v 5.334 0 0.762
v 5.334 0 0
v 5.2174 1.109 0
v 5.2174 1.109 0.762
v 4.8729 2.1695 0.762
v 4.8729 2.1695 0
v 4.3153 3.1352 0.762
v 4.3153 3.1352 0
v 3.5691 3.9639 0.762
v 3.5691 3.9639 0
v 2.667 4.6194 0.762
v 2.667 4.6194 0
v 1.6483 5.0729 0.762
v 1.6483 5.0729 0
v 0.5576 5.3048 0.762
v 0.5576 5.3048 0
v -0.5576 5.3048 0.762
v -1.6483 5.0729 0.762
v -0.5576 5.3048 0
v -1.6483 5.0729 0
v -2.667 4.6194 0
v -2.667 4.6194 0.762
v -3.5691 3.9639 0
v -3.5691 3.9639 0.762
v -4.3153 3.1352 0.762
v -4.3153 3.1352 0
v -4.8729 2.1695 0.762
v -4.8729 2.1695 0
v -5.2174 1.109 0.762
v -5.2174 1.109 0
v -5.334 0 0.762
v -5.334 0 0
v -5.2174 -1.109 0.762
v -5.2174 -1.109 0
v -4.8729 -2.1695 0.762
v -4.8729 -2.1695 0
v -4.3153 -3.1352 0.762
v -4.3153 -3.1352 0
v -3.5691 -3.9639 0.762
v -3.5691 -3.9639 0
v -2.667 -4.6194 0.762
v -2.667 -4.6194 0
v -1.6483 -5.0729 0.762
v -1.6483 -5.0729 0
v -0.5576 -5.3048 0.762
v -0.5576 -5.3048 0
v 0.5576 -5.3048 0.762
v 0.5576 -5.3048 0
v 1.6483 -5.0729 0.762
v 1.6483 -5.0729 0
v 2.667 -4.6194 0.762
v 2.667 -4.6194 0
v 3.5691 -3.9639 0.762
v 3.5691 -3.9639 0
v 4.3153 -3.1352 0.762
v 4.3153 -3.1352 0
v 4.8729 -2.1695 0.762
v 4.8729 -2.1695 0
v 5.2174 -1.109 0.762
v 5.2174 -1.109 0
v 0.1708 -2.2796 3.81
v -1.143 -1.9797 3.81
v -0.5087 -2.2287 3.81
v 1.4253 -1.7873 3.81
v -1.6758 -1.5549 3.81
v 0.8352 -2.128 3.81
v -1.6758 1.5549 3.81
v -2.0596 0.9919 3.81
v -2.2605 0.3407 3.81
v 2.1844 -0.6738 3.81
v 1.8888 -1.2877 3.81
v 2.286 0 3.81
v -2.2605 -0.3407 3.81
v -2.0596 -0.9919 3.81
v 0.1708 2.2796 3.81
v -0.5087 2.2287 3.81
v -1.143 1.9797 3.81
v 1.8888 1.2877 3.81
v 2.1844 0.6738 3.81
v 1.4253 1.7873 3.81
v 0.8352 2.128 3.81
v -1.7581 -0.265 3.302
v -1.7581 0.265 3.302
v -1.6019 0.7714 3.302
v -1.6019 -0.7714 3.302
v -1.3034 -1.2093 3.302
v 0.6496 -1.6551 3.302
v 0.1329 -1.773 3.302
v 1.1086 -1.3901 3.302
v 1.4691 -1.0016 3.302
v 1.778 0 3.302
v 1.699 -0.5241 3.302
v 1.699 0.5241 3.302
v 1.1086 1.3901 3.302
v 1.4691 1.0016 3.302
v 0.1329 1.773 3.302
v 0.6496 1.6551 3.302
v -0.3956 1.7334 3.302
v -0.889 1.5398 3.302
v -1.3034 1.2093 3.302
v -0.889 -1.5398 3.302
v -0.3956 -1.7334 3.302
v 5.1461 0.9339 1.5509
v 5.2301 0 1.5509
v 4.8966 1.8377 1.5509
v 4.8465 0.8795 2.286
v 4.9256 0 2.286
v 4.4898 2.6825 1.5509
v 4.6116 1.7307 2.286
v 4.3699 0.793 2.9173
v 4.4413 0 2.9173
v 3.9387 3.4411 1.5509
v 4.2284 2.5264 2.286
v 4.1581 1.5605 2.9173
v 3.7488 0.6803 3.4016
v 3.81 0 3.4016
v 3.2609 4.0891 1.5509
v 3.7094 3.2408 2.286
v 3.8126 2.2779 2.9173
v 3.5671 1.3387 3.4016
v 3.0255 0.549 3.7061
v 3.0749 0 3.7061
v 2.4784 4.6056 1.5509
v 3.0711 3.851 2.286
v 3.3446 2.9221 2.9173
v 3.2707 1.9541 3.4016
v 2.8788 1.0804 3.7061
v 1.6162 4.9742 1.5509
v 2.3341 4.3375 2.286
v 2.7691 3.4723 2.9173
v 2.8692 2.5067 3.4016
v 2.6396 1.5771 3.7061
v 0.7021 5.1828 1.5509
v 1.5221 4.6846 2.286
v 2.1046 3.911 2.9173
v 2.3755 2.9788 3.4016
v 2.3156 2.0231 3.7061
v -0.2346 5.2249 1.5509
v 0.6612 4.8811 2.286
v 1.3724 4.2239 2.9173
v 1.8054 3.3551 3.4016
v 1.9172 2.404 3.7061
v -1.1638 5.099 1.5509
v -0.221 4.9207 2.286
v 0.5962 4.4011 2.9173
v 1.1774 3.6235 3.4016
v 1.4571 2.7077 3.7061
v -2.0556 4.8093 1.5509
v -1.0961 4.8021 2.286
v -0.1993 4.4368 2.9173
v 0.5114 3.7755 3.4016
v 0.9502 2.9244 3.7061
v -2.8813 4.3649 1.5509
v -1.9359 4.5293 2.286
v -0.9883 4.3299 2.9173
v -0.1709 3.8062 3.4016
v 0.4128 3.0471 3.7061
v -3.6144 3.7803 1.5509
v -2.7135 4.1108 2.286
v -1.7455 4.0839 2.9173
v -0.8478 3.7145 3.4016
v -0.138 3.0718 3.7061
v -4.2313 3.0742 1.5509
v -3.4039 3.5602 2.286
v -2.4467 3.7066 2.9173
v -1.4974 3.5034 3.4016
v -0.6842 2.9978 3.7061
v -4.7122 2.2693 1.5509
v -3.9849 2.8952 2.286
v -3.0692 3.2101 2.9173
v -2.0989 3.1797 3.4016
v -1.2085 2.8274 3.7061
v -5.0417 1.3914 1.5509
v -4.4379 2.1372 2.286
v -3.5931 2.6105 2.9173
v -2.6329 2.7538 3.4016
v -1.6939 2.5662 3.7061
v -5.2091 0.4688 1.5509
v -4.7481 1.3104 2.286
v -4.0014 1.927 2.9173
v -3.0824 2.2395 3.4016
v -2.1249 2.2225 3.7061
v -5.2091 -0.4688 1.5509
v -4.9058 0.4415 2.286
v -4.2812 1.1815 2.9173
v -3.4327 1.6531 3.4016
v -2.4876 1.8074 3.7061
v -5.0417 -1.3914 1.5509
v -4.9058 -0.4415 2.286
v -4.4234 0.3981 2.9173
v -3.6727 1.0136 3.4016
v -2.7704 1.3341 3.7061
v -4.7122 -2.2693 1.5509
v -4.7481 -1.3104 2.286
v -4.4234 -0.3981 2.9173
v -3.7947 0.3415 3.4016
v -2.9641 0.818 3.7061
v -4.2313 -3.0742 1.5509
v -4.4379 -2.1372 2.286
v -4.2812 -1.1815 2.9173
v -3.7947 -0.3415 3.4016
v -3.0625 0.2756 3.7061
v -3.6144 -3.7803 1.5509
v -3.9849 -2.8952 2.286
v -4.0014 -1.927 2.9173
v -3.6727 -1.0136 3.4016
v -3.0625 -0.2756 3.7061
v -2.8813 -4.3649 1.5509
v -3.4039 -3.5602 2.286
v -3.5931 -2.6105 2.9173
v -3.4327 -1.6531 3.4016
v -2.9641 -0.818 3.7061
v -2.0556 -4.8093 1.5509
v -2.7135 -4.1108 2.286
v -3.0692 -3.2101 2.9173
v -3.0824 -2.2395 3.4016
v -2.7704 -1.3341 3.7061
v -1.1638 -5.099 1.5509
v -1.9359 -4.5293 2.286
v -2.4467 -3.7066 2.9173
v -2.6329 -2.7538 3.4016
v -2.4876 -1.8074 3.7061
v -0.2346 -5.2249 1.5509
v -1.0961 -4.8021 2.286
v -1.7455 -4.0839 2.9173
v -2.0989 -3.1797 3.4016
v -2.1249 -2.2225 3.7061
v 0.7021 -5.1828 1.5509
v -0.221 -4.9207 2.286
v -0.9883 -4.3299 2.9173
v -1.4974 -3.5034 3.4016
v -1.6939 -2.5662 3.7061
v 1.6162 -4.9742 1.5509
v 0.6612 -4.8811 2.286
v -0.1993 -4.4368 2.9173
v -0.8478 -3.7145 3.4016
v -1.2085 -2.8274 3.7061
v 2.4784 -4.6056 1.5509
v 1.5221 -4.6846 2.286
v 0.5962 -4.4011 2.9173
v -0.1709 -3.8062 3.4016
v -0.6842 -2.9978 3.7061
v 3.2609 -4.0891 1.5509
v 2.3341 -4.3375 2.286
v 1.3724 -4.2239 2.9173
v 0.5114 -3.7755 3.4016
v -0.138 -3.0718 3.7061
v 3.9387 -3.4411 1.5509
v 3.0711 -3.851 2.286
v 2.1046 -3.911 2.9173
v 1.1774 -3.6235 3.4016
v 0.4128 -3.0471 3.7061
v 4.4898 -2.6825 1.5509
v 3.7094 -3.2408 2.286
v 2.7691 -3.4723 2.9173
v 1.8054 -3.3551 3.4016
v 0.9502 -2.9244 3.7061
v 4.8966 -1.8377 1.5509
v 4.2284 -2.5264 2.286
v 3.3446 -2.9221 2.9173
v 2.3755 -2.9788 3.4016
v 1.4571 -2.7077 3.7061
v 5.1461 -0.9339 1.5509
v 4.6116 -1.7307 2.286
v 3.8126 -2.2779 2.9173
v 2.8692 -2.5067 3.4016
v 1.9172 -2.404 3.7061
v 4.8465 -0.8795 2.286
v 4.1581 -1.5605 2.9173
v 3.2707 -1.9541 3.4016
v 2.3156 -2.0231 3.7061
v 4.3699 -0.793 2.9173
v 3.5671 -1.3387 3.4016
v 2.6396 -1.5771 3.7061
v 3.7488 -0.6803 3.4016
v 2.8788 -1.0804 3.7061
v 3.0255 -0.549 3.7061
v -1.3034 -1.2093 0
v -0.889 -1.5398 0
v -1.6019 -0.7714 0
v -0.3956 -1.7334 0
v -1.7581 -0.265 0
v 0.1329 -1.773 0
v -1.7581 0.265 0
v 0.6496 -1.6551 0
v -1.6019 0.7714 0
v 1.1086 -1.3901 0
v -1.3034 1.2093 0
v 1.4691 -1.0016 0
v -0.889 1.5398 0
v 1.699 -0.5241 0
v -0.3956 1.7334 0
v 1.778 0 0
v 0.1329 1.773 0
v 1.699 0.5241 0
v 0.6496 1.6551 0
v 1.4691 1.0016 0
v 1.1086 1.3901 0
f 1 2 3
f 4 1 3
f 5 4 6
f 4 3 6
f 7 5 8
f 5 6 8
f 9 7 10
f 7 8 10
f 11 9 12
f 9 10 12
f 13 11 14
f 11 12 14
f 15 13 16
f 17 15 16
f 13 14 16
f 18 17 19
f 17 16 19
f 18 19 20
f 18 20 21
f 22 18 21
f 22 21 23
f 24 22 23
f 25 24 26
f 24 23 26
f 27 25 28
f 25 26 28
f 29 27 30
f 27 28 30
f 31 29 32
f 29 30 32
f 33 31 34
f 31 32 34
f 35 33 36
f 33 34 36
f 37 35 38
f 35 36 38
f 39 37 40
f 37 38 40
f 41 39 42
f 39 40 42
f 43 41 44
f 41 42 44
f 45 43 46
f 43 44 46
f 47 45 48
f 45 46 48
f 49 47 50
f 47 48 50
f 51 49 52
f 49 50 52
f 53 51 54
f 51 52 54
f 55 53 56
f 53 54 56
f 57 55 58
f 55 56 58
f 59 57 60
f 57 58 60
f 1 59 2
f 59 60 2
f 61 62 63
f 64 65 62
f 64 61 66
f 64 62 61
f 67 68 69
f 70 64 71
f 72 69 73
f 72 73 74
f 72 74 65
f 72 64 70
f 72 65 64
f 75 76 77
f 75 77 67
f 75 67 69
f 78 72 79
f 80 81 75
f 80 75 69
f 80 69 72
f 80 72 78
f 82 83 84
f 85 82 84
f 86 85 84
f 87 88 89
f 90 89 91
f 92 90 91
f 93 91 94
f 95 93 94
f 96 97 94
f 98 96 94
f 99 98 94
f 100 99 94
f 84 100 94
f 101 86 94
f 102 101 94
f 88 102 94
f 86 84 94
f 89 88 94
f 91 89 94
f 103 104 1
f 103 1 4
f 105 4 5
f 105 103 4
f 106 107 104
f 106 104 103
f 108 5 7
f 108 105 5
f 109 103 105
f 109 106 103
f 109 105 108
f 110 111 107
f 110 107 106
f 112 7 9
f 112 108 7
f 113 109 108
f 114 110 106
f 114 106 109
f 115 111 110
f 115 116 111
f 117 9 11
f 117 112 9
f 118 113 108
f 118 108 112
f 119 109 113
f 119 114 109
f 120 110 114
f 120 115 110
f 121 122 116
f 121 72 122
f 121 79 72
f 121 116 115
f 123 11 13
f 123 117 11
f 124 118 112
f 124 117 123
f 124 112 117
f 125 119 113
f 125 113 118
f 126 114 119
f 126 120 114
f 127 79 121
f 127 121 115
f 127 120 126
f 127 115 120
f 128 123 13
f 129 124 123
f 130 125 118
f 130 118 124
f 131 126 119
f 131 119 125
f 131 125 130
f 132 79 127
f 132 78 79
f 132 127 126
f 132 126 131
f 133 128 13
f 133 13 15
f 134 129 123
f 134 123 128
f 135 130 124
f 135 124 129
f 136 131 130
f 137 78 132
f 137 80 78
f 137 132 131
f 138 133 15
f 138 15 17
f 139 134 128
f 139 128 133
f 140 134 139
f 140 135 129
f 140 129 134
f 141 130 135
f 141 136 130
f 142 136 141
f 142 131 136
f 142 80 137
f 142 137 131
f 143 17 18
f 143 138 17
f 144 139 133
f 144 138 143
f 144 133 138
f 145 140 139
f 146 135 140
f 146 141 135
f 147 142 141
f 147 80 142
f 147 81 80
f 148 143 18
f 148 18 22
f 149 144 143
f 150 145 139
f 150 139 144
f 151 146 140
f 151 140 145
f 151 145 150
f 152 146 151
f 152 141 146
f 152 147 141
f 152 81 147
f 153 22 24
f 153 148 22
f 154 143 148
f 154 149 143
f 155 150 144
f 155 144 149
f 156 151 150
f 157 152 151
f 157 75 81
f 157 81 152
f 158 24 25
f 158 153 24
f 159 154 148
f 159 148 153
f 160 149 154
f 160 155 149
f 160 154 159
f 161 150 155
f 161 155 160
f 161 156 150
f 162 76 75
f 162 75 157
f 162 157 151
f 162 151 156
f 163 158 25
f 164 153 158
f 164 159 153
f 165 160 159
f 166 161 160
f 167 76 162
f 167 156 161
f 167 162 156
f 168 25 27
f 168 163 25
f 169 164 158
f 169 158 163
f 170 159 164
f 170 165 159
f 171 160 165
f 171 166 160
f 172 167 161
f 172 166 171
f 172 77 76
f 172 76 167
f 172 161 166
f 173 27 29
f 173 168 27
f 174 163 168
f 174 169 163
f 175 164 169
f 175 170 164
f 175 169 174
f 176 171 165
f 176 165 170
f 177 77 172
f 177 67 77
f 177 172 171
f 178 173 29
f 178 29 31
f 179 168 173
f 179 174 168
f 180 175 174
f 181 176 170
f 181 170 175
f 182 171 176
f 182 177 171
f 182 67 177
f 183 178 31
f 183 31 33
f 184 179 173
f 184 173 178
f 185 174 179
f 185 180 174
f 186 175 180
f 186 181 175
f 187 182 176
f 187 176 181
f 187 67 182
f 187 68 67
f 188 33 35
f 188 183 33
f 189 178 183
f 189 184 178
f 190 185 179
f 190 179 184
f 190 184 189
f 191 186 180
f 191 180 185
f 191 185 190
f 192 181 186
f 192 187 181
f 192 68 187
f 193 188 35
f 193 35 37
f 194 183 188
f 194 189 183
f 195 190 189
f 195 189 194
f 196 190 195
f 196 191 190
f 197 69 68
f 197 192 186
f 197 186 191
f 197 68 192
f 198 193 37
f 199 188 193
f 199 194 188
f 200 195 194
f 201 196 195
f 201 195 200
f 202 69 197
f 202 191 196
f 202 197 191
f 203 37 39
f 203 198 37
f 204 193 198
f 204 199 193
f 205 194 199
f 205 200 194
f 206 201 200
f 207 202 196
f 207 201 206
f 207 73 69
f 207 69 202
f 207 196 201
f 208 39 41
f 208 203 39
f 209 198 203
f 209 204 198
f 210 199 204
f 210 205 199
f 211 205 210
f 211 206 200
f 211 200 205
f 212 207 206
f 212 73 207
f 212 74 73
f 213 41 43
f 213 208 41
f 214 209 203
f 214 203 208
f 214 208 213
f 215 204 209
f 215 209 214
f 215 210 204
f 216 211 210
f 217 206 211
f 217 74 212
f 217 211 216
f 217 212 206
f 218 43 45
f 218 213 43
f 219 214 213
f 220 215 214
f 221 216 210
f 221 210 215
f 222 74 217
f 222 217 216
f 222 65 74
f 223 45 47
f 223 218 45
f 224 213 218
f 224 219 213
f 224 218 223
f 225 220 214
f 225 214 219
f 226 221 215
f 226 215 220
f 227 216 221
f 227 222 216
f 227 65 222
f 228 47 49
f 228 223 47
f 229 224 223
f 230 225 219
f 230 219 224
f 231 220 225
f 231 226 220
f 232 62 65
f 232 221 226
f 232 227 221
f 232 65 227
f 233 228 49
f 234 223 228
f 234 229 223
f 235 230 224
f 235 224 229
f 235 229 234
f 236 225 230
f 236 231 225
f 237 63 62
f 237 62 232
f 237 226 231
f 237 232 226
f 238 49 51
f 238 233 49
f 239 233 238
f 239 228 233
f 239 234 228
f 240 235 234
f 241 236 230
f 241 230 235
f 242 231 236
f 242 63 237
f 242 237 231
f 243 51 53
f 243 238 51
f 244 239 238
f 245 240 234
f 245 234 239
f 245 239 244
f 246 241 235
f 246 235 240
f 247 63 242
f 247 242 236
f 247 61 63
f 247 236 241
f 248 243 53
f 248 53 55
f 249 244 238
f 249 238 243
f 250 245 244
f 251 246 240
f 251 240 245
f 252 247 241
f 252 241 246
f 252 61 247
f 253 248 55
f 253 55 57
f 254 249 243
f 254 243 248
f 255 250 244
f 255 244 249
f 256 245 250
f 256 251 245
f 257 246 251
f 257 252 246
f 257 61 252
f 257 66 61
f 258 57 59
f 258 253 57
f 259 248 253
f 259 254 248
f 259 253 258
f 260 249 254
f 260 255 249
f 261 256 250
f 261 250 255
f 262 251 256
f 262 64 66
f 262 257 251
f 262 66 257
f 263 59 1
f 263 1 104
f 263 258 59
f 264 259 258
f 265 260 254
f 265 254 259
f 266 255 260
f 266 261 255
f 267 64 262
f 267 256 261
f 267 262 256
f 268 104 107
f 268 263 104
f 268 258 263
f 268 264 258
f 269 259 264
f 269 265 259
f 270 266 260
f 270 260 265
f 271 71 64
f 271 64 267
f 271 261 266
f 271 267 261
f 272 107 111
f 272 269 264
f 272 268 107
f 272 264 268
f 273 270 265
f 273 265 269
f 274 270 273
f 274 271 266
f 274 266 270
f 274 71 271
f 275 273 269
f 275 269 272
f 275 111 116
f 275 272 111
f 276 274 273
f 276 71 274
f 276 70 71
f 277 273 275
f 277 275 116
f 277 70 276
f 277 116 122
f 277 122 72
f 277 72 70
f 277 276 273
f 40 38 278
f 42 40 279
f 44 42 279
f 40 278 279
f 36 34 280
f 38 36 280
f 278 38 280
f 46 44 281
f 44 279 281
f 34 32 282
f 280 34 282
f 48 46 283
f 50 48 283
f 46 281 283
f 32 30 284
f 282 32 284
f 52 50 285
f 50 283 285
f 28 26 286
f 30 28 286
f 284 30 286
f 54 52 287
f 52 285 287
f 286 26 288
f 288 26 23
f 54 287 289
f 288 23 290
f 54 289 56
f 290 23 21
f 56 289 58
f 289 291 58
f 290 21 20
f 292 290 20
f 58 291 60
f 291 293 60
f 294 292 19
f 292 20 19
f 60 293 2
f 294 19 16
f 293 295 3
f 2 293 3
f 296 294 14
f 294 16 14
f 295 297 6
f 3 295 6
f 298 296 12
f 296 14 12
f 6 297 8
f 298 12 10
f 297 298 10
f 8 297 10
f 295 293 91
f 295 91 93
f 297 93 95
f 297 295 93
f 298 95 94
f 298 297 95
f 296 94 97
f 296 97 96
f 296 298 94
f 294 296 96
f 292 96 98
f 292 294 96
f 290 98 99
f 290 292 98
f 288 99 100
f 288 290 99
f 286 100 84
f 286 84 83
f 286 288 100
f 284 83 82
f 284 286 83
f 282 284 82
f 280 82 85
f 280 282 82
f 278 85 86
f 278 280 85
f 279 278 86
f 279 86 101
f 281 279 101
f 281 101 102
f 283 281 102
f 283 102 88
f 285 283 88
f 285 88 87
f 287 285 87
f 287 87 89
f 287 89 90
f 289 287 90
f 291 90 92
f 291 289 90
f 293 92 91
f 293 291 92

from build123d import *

# Parameters (mm, degrees)
F0_R     = 5.334
F0_R_2   = 1.778
F1_DEPTH = 3.81
F2_R     = 3.048
F3_DEPTH = 3.302


with BuildPart() as f1:
    # F0 (on Top) → F1 (new body)
    with BuildSketch(Plane.XY):
        Circle(F0_R)
        Circle(F0_R_2, mode=Mode.SUBTRACT)
        Circle(F0_R_2)
    extrude(amount=F1_DEPTH)

    # F2
    f2_edges = [f1.edges().sort_by_distance(p)[0] for p in [
        (-5.334, 0, 3.81),
    ]]
    fillet(f2_edges, radius=F2_R)

    # F0 (on Top) → F3 (cut)
    with BuildSketch(Plane.XY):
        Circle(F0_R_2)
    extrude(amount=F3_DEPTH, mode=Mode.SUBTRACT)


solid = f1.part
